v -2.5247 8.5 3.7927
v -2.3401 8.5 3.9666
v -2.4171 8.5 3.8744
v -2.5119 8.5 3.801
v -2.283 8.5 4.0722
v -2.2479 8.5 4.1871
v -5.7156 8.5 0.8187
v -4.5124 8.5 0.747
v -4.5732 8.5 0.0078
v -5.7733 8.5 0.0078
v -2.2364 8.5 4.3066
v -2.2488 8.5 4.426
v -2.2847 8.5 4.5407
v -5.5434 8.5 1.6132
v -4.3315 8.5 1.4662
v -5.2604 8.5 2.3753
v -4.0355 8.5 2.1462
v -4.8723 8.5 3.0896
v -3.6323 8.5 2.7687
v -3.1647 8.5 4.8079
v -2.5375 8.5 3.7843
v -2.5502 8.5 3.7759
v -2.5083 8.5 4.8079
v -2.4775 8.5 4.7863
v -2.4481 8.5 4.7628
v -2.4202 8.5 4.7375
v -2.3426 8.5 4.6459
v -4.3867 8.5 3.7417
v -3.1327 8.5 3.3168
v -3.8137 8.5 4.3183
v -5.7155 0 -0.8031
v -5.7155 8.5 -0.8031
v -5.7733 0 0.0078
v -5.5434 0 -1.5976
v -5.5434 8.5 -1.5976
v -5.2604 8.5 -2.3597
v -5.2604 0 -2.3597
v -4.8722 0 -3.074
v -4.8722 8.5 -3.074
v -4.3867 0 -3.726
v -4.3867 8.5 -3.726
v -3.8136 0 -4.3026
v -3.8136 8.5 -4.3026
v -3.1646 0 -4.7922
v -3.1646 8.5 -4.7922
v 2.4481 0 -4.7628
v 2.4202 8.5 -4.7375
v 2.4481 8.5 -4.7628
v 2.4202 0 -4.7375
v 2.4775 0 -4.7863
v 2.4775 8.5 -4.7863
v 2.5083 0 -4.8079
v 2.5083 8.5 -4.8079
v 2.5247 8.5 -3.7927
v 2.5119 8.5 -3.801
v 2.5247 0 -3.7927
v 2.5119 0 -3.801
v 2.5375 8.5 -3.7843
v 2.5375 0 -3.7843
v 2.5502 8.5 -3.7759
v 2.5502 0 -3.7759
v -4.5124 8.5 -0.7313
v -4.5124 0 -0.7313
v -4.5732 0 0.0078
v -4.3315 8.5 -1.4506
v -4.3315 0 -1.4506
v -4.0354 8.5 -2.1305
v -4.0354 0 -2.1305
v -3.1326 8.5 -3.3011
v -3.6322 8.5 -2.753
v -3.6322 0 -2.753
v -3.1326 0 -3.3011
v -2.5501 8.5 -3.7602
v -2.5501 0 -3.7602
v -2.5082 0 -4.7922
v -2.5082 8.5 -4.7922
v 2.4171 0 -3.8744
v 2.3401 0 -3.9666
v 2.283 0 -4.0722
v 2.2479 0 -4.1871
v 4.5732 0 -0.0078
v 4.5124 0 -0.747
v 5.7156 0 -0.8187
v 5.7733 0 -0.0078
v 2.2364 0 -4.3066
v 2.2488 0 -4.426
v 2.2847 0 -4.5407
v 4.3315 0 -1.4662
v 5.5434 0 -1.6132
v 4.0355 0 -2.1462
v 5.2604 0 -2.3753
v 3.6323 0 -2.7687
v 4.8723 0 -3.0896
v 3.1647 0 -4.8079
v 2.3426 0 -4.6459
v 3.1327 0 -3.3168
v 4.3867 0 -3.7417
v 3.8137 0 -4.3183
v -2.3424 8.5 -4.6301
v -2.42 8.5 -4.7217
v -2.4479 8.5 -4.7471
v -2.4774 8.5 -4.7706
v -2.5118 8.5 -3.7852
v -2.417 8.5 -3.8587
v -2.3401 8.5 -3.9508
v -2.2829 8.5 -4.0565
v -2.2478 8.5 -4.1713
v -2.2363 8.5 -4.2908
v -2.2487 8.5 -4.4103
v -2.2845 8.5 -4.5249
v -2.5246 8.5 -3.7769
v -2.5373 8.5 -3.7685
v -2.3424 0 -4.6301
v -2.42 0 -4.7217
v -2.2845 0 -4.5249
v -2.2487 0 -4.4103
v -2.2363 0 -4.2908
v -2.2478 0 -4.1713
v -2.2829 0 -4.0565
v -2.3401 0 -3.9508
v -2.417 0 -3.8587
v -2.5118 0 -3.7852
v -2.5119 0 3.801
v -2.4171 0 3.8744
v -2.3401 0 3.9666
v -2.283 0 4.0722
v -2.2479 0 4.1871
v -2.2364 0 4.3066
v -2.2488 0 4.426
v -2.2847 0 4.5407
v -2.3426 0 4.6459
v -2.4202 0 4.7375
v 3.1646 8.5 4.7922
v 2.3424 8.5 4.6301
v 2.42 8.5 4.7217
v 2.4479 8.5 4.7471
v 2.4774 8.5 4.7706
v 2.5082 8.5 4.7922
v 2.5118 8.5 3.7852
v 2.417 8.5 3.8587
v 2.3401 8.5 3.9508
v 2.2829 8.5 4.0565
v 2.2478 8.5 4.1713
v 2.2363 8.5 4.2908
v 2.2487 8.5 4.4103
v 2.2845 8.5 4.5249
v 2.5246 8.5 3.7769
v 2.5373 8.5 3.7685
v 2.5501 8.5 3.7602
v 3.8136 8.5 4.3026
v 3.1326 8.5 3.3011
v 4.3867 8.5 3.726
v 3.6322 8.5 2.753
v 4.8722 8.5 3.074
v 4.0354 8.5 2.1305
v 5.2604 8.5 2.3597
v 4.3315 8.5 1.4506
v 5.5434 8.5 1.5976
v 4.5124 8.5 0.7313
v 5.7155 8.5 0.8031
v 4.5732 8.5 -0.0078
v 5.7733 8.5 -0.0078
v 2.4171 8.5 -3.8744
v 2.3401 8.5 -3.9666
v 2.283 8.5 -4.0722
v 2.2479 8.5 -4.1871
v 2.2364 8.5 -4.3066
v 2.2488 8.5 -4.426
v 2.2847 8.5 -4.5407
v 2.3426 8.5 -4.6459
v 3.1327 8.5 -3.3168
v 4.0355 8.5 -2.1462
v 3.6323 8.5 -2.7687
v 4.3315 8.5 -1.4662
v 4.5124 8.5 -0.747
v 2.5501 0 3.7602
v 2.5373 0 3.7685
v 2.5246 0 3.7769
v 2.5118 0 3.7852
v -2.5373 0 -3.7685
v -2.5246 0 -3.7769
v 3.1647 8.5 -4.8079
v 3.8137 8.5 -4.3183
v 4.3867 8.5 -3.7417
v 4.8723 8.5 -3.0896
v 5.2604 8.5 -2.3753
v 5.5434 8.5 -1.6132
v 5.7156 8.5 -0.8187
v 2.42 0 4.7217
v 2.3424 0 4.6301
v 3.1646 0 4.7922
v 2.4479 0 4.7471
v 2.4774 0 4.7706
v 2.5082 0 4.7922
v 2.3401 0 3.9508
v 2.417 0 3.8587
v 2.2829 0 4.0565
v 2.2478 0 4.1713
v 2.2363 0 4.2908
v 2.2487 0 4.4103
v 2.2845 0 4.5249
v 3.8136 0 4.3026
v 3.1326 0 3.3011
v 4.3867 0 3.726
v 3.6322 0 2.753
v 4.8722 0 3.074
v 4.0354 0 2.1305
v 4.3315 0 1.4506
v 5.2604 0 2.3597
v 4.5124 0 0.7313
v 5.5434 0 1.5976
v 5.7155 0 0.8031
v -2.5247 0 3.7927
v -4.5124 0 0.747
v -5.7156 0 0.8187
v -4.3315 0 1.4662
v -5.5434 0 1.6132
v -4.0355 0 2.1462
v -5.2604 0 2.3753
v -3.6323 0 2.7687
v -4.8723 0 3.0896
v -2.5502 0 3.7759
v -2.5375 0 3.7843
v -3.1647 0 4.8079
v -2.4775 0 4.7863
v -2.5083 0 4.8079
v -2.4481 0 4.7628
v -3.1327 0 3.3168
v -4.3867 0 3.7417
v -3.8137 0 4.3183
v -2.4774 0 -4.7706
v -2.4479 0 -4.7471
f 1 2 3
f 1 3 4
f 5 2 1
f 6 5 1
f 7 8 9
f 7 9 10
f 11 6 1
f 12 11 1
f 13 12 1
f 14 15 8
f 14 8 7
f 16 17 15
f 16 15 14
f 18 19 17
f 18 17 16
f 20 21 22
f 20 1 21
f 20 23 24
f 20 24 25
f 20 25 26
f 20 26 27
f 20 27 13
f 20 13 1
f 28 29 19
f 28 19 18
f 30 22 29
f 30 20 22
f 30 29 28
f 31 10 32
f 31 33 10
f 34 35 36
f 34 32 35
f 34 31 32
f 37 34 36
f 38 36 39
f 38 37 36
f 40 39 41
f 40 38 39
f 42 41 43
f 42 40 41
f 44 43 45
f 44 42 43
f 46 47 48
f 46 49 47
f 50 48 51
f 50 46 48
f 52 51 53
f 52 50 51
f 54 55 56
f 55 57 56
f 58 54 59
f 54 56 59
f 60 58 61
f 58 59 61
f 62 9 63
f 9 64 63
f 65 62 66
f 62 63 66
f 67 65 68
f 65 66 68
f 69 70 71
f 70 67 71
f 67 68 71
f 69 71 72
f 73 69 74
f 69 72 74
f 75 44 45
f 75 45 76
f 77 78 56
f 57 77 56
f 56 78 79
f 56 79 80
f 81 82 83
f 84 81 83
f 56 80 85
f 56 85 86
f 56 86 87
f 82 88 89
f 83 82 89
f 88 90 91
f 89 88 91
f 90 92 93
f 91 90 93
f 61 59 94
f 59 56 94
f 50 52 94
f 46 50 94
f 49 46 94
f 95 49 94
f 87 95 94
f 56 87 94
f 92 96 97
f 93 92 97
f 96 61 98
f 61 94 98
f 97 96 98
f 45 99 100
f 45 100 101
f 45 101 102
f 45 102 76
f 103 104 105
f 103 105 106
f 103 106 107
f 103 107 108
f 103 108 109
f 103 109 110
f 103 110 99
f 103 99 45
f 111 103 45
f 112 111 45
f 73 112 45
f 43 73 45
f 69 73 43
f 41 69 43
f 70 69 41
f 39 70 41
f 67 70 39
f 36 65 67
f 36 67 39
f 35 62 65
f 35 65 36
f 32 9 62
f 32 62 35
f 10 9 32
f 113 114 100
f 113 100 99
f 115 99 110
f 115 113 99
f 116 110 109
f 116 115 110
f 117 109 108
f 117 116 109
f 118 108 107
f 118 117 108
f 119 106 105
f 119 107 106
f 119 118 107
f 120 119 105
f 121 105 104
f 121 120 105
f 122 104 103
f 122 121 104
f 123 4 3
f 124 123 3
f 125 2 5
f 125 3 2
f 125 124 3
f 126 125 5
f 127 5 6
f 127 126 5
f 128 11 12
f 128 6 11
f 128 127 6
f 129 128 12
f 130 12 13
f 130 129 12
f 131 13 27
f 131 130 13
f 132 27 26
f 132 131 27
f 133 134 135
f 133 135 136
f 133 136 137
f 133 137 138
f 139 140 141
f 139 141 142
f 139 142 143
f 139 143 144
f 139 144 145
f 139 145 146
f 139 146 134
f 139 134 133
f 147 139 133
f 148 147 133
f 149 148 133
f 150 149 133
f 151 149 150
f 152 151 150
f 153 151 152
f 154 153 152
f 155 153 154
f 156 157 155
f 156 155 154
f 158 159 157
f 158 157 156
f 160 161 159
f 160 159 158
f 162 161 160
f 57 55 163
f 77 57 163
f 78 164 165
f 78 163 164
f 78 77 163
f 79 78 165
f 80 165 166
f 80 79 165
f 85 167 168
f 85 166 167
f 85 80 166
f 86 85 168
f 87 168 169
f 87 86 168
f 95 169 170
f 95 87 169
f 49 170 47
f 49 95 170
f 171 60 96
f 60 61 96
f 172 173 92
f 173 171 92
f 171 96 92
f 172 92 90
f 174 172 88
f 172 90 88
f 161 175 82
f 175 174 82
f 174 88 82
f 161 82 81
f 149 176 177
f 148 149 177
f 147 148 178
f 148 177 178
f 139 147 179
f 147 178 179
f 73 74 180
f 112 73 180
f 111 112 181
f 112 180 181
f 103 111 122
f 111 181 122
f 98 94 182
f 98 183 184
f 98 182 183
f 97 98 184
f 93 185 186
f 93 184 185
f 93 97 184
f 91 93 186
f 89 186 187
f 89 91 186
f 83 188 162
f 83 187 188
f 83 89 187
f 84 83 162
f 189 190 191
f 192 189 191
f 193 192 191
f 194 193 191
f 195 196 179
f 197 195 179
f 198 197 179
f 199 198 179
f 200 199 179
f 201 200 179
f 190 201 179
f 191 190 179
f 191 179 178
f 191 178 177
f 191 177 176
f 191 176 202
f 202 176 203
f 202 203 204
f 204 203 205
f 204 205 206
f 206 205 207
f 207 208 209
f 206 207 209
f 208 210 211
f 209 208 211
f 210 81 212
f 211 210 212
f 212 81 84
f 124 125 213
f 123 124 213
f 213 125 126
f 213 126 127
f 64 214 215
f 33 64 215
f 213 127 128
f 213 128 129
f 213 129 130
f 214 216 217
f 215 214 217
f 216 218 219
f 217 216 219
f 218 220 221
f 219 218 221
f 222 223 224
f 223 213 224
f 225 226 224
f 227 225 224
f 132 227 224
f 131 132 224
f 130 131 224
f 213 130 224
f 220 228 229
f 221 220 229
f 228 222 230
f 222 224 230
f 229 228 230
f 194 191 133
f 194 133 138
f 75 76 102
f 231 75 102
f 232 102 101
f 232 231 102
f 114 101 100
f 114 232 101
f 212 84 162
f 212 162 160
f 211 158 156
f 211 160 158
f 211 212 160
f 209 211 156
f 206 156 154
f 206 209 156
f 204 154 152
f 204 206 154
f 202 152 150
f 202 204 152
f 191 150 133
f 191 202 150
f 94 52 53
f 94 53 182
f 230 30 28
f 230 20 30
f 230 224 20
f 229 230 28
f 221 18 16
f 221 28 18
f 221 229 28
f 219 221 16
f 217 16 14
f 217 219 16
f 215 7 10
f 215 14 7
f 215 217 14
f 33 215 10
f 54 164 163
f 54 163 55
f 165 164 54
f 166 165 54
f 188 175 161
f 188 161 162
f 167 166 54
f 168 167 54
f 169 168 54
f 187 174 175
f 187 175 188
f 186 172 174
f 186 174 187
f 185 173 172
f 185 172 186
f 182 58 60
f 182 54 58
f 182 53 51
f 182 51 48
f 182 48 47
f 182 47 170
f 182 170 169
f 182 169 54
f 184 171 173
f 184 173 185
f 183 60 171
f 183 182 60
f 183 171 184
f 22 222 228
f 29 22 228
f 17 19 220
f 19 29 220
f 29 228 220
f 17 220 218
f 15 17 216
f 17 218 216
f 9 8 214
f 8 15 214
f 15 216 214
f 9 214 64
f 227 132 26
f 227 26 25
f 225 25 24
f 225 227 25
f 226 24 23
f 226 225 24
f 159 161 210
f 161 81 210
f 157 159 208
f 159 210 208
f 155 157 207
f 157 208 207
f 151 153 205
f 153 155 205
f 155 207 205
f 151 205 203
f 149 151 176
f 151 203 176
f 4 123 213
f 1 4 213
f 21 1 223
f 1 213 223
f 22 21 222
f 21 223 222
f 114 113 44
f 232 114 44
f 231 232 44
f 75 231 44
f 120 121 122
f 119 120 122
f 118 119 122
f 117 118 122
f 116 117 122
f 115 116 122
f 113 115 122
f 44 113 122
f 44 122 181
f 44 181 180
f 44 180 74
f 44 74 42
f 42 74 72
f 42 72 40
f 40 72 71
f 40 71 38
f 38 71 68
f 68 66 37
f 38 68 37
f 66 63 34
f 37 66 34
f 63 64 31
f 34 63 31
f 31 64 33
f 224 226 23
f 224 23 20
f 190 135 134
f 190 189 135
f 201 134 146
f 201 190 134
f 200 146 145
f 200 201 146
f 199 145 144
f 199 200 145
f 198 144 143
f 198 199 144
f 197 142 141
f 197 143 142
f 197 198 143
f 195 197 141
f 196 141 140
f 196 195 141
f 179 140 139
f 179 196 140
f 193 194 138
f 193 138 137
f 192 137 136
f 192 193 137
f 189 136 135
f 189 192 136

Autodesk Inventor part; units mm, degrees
ref_plane "YZ Plane" through (0, 0, 0) normal (1, 0, 0) x (0, 1, 0)
ref_plane "XZ Plane" through (0, 0, 0) normal (0, 1, 0) x (-1, 0, 0)
ref_plane "XY Plane" through (0, 0, 0) normal (0, 0, 1) x (1, 0, 0)
sketch "Esboço1" plane through (0, 0, 0) normal (0, 1, 0) x (-1, 0, 0)
  line L0 (3.2233, 5.0079) -> (-3.2768, 5.0079)
  line L1 (-3.2767, -4.9922) -> (3.2232, -4.9922)
  arc A0 (3.2232, -4.9922) -> (3.2233, 5.0079) centre (0.0528, 0.0079) ccw
  arc A1 (-3.2768, 5.0079) -> (-3.2767, -4.9922) centre (-0.1063, 0.0079) ccw
  line L2 (3.2233, 5.0079) -> (-3.2768, 5.0079)
  line L3 (-3.2767, -4.9922) -> (3.2232, -4.9922)
  line L4 (3.1646, -4.7922) -> (-3.2181, -4.7922)
  arc A2 (-3.2182, 4.8079) -> (-3.2181, -4.7922) centre (-0.1063, 0.0079) ccw
  line L5 (-3.2182, 4.8079) -> (3.1647, 4.8079)
  arc A3 (3.1646, -4.7922) -> (3.1647, 4.8079) centre (0.0528, 0.0079) ccw
  arc A4 (-2.2768, 4.658) -> (-2.0269, 4.808) centre (-2.2768, 4.9413) ccw
  arc A5 (-2.5268, 4.808) -> (-2.2768, 4.658) centre (-2.2768, 4.9413) ccw
  line L6 (-0.0267, 5.0079) -> (-0.0267, 0.0079)
  line L7 (-0.0267, 5.0079) -> (4.9733, 5.0079) construction
  line L8 (-0.0267, 0.0079) -> (-0.0267, -4.9922)
  line L9 (-0.0267, 0.0079) -> (-6.0268, 0.0078)
  line L10 (-0.0267, 0.0079) -> (5.9733, 0.0078)
  arc A6 (-2.0267, -4.7922) -> (-2.2767, -4.6422) centre (-2.2767, -4.9255) ccw
  arc A7 (-2.2767, -4.6422) -> (-2.5267, -4.7922) centre (-2.2767, -4.9255) ccw
  line L11 (-0.0266, -4.9921) -> (-0.0267, 0.0079)
  arc A8 (2.2232, -4.6422) -> (1.9732, -4.7922) centre (2.2232, -4.9255) ccw
  arc A9 (2.4732, -4.7922) -> (2.2232, -4.6422) centre (2.2232, -4.9255) ccw
  arc A10 (1.9734, 4.808) -> (2.2234, 4.658) centre (2.2233, 4.9413) ccw
  arc A11 (2.2234, 4.658) -> (2.4733, 4.808) centre (2.2233, 4.9413) ccw
  arc A12 (2.5118, -3.7852) -> (2.5119, 3.801) centre (0.0528, 0.0079) ccw
  arc A13 (2.5501, -3.7602) -> (2.5082, -4.7922) centre (2.8382, -4.2887) ccw
  arc A14 (2.5083, 4.8079) -> (2.5502, 3.7759) centre (2.8383, 4.3045) ccw
  dimension "d21" = 0.2
  dimension "d22" = 0.2
  dimension "d23" = 0.2
  dimension "d24" = 0.2
  dimension "d28" = 1
  dimension "d29" = 5
  dimension "d30" = 90
  dimension "d31" = 1
  dimension "d32" = 1
  dimension "d33" = 1
extrude "Extrusão1" add sketch "Esboço1" along normal blind 8.5 contours L10 A12 A14 L5 A3 | A3 L4 A13 A12 L10
pattern_circular "Padrão circular1" count 2 over 360 about axis through (0, -10, 0) along (0, 1, 0) of "Extrusão1"
properties part number "Imãs"
